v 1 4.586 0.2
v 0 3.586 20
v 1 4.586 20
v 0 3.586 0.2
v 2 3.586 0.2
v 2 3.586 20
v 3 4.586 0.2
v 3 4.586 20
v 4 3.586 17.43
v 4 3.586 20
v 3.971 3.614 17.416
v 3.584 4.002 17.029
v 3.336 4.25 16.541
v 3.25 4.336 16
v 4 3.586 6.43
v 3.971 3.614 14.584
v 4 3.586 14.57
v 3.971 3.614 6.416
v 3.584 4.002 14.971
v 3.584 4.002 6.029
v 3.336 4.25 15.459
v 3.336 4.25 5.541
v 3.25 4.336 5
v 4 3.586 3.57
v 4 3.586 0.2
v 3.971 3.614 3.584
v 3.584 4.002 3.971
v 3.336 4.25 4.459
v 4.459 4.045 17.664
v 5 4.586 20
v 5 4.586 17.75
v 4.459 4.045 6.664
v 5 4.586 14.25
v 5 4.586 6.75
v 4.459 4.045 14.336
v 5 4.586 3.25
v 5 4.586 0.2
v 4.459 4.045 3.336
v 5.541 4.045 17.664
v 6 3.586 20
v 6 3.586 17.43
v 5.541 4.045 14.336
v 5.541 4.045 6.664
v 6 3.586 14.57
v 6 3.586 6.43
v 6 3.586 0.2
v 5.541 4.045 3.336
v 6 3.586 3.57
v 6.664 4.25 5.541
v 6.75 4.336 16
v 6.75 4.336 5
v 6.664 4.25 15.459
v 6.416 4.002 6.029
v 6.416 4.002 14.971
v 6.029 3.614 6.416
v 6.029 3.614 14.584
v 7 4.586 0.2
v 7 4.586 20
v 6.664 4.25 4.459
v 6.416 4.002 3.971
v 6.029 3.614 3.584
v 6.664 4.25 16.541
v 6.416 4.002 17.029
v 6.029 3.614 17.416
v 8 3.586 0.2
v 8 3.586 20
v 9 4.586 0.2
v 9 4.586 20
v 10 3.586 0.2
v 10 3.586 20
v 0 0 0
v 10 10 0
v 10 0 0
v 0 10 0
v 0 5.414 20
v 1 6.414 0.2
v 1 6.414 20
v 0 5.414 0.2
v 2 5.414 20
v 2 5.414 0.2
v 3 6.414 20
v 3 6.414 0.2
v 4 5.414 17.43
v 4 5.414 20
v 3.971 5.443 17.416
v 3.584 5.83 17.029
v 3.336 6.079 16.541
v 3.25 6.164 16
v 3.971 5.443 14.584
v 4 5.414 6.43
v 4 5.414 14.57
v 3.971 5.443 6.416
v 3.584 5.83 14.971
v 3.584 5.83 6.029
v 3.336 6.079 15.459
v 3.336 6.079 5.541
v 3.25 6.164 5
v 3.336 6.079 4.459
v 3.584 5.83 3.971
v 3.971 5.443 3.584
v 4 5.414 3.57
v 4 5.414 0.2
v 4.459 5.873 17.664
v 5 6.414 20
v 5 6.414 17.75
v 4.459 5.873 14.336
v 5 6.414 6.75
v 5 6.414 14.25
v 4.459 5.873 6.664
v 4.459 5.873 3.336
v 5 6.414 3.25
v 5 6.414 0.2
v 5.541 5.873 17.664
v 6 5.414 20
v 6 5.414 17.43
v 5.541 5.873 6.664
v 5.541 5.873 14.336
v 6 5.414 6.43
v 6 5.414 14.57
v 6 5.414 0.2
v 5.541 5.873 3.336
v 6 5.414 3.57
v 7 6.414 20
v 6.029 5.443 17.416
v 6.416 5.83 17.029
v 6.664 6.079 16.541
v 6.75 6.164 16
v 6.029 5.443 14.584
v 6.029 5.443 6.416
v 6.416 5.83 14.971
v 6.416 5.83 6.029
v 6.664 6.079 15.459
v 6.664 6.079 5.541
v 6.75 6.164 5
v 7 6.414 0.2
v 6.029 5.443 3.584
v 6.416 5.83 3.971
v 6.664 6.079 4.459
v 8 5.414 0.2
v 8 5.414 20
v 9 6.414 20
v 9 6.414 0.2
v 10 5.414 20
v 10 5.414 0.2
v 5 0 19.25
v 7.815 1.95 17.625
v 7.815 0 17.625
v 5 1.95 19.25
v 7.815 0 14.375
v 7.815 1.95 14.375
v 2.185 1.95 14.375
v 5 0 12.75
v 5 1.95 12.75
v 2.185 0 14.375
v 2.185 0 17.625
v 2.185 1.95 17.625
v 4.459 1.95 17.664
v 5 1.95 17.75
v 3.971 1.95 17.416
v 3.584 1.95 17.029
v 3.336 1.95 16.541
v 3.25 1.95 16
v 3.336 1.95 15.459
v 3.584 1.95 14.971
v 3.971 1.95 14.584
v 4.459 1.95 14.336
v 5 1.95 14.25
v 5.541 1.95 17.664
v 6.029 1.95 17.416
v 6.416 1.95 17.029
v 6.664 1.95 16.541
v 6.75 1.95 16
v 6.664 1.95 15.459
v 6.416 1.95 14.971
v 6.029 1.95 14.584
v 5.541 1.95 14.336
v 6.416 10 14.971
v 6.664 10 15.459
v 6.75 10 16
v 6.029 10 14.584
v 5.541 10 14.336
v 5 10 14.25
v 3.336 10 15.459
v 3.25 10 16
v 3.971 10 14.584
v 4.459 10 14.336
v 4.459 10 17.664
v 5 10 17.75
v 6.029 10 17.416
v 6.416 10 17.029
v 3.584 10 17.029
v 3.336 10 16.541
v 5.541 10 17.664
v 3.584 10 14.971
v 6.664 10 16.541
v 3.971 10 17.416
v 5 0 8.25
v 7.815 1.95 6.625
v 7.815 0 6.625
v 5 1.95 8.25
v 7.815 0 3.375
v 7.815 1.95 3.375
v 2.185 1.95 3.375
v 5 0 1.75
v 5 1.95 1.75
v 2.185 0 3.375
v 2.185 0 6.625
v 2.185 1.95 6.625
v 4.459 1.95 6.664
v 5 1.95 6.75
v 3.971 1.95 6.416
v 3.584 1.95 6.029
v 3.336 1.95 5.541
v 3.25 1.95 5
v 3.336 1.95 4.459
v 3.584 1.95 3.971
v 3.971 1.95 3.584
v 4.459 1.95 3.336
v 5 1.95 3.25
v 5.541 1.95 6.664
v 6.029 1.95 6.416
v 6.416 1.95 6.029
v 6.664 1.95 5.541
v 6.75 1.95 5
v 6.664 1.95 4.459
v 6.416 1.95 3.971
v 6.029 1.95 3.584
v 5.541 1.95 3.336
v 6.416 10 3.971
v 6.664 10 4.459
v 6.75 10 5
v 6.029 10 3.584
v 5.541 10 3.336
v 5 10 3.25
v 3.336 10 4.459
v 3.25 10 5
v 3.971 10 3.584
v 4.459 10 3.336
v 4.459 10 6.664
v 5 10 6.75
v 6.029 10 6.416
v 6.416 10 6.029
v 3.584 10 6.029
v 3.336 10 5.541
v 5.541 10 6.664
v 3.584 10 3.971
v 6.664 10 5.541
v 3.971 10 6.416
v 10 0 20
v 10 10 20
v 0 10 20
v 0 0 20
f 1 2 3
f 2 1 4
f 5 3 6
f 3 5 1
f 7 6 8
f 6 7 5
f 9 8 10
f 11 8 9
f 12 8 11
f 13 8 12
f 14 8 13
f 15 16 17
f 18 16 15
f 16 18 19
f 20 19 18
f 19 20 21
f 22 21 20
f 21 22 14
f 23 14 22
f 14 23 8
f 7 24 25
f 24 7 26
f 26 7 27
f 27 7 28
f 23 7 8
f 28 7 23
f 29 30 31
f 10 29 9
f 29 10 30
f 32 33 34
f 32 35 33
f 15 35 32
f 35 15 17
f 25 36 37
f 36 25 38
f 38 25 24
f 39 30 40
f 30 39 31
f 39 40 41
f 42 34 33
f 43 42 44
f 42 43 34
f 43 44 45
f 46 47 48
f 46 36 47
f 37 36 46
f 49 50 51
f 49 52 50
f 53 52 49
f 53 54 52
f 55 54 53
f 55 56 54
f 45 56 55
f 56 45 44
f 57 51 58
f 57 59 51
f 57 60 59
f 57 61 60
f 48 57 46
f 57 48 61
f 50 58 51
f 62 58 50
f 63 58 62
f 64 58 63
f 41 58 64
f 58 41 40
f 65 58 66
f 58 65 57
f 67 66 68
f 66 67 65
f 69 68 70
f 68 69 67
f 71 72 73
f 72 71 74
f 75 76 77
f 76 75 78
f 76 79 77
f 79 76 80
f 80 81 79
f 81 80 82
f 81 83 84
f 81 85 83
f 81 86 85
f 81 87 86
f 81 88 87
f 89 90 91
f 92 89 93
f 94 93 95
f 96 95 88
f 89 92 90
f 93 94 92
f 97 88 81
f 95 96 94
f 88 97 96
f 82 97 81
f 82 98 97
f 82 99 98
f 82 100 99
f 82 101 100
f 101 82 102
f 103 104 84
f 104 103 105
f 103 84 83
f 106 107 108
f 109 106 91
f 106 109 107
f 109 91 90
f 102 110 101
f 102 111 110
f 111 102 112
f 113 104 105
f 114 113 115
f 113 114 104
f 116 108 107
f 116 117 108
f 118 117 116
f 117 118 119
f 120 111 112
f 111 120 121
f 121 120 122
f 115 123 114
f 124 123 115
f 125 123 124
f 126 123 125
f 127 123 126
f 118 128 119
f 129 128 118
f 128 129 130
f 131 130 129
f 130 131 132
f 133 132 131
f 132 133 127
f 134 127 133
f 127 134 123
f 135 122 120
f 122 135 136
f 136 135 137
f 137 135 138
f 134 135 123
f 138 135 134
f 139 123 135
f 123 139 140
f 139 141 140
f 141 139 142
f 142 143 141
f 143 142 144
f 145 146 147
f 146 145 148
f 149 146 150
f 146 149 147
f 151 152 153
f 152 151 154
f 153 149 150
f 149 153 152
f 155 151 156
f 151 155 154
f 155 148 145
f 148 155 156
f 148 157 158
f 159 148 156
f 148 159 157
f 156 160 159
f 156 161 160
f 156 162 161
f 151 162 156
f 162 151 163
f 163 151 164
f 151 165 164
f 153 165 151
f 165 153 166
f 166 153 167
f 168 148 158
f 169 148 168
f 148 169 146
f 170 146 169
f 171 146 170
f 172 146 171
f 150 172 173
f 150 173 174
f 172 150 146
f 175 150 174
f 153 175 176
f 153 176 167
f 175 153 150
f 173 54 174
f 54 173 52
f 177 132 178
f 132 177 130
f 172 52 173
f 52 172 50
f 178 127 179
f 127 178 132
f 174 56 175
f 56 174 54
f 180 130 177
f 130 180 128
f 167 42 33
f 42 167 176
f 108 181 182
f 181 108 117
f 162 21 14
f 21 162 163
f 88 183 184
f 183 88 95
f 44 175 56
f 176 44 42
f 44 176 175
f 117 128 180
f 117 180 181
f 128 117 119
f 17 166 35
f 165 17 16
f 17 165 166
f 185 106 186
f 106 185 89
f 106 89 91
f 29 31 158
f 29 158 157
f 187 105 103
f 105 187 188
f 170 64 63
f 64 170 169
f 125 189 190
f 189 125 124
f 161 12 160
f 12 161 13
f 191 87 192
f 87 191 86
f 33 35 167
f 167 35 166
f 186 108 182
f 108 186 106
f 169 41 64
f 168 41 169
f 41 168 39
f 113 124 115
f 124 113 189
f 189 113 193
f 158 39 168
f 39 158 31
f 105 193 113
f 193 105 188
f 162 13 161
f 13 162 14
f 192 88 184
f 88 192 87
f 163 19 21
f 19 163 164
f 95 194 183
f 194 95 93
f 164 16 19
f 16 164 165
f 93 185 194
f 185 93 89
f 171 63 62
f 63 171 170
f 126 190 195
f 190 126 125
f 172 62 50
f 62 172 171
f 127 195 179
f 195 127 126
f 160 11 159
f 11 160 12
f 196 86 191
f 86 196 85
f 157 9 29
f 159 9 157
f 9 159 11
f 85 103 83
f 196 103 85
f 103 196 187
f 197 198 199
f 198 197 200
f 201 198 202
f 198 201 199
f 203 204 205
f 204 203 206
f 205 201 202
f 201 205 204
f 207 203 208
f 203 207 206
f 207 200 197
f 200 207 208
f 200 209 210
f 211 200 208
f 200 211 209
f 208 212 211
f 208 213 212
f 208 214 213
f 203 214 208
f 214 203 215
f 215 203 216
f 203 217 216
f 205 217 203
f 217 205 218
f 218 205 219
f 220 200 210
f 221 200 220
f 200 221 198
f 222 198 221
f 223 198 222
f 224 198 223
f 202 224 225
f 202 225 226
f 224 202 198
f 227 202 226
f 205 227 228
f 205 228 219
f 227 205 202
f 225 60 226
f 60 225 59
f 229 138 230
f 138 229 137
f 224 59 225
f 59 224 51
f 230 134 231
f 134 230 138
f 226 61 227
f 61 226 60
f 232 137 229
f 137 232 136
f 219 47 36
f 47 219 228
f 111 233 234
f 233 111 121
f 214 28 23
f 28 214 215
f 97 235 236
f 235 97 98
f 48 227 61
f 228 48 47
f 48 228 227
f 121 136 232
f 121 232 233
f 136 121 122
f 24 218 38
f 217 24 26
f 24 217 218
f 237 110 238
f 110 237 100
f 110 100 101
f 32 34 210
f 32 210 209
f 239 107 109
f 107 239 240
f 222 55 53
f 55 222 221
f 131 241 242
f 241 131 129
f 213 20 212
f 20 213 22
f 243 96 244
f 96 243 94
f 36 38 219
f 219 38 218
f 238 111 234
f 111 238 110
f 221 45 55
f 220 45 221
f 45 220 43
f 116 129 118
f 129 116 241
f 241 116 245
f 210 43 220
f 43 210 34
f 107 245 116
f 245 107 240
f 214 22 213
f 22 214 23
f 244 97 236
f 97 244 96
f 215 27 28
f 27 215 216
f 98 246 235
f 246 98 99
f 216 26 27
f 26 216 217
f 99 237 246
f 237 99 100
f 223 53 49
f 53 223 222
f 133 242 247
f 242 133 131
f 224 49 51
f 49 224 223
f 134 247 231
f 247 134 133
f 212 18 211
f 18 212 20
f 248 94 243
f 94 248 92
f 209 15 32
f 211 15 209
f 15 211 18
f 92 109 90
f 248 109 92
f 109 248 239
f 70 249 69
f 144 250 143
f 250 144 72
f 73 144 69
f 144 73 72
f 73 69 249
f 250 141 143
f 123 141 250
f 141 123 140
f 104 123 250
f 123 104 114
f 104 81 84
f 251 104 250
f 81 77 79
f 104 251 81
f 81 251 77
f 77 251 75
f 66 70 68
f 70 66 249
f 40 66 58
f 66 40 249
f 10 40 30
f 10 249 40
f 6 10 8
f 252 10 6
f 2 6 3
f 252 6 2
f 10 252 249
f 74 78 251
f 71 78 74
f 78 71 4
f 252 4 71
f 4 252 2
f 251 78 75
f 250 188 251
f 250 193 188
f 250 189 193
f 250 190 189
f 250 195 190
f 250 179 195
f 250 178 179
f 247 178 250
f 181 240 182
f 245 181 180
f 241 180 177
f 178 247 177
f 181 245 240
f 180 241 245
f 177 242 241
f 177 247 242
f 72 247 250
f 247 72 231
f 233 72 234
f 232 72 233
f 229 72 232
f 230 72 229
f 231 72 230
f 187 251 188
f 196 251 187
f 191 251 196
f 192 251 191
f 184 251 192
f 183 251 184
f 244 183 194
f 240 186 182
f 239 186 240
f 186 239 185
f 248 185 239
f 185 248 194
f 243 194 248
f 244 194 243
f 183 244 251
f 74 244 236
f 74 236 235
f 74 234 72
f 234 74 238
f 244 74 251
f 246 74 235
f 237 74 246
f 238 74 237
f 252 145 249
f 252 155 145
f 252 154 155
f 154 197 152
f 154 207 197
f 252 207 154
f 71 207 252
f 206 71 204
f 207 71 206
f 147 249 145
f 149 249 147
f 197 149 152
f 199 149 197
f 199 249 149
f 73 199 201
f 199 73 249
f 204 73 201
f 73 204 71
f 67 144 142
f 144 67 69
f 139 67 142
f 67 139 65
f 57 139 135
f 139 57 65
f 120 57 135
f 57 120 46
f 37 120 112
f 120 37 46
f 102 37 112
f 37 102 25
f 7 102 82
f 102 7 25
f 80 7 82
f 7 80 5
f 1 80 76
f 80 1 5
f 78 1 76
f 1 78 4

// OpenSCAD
cube([10,10,.2]);

difference(){
  cube([10,10,20]);
  intersection(){
    translate([-.01,3,0]) cube([10.02,2,23]);
    translate([0,5,10.99]) {
      for(x=[0:2:17])
        translate([x,0]) rotate([0,0,45]) cube([2,2,23],center=true);
    }
  }
  intersection(){
    translate([-.01,4.99,0]) cube([10.02,2,23]);
    translate([0,5,10.99]) {
      for(x=[0:2:17])
        translate([x+1,0]) rotate([0,0,45]) cube([2,2,23],center=true);
    }
  }
  translate([5,-.05,16]) rotate([-90,0]) {
    rotate([0,0,30]) cylinder(d=6.5,h=2,$fn=6);
    cylinder(d=3.5,h=12,$fn=20);
  }
  translate([5,-.05,5]) rotate([-90,0]) {
    rotate([0,0,30]) cylinder(d=6.5,h=2,$fn=6);
    cylinder(d=3.5,h=12,$fn=20);
  }
}
